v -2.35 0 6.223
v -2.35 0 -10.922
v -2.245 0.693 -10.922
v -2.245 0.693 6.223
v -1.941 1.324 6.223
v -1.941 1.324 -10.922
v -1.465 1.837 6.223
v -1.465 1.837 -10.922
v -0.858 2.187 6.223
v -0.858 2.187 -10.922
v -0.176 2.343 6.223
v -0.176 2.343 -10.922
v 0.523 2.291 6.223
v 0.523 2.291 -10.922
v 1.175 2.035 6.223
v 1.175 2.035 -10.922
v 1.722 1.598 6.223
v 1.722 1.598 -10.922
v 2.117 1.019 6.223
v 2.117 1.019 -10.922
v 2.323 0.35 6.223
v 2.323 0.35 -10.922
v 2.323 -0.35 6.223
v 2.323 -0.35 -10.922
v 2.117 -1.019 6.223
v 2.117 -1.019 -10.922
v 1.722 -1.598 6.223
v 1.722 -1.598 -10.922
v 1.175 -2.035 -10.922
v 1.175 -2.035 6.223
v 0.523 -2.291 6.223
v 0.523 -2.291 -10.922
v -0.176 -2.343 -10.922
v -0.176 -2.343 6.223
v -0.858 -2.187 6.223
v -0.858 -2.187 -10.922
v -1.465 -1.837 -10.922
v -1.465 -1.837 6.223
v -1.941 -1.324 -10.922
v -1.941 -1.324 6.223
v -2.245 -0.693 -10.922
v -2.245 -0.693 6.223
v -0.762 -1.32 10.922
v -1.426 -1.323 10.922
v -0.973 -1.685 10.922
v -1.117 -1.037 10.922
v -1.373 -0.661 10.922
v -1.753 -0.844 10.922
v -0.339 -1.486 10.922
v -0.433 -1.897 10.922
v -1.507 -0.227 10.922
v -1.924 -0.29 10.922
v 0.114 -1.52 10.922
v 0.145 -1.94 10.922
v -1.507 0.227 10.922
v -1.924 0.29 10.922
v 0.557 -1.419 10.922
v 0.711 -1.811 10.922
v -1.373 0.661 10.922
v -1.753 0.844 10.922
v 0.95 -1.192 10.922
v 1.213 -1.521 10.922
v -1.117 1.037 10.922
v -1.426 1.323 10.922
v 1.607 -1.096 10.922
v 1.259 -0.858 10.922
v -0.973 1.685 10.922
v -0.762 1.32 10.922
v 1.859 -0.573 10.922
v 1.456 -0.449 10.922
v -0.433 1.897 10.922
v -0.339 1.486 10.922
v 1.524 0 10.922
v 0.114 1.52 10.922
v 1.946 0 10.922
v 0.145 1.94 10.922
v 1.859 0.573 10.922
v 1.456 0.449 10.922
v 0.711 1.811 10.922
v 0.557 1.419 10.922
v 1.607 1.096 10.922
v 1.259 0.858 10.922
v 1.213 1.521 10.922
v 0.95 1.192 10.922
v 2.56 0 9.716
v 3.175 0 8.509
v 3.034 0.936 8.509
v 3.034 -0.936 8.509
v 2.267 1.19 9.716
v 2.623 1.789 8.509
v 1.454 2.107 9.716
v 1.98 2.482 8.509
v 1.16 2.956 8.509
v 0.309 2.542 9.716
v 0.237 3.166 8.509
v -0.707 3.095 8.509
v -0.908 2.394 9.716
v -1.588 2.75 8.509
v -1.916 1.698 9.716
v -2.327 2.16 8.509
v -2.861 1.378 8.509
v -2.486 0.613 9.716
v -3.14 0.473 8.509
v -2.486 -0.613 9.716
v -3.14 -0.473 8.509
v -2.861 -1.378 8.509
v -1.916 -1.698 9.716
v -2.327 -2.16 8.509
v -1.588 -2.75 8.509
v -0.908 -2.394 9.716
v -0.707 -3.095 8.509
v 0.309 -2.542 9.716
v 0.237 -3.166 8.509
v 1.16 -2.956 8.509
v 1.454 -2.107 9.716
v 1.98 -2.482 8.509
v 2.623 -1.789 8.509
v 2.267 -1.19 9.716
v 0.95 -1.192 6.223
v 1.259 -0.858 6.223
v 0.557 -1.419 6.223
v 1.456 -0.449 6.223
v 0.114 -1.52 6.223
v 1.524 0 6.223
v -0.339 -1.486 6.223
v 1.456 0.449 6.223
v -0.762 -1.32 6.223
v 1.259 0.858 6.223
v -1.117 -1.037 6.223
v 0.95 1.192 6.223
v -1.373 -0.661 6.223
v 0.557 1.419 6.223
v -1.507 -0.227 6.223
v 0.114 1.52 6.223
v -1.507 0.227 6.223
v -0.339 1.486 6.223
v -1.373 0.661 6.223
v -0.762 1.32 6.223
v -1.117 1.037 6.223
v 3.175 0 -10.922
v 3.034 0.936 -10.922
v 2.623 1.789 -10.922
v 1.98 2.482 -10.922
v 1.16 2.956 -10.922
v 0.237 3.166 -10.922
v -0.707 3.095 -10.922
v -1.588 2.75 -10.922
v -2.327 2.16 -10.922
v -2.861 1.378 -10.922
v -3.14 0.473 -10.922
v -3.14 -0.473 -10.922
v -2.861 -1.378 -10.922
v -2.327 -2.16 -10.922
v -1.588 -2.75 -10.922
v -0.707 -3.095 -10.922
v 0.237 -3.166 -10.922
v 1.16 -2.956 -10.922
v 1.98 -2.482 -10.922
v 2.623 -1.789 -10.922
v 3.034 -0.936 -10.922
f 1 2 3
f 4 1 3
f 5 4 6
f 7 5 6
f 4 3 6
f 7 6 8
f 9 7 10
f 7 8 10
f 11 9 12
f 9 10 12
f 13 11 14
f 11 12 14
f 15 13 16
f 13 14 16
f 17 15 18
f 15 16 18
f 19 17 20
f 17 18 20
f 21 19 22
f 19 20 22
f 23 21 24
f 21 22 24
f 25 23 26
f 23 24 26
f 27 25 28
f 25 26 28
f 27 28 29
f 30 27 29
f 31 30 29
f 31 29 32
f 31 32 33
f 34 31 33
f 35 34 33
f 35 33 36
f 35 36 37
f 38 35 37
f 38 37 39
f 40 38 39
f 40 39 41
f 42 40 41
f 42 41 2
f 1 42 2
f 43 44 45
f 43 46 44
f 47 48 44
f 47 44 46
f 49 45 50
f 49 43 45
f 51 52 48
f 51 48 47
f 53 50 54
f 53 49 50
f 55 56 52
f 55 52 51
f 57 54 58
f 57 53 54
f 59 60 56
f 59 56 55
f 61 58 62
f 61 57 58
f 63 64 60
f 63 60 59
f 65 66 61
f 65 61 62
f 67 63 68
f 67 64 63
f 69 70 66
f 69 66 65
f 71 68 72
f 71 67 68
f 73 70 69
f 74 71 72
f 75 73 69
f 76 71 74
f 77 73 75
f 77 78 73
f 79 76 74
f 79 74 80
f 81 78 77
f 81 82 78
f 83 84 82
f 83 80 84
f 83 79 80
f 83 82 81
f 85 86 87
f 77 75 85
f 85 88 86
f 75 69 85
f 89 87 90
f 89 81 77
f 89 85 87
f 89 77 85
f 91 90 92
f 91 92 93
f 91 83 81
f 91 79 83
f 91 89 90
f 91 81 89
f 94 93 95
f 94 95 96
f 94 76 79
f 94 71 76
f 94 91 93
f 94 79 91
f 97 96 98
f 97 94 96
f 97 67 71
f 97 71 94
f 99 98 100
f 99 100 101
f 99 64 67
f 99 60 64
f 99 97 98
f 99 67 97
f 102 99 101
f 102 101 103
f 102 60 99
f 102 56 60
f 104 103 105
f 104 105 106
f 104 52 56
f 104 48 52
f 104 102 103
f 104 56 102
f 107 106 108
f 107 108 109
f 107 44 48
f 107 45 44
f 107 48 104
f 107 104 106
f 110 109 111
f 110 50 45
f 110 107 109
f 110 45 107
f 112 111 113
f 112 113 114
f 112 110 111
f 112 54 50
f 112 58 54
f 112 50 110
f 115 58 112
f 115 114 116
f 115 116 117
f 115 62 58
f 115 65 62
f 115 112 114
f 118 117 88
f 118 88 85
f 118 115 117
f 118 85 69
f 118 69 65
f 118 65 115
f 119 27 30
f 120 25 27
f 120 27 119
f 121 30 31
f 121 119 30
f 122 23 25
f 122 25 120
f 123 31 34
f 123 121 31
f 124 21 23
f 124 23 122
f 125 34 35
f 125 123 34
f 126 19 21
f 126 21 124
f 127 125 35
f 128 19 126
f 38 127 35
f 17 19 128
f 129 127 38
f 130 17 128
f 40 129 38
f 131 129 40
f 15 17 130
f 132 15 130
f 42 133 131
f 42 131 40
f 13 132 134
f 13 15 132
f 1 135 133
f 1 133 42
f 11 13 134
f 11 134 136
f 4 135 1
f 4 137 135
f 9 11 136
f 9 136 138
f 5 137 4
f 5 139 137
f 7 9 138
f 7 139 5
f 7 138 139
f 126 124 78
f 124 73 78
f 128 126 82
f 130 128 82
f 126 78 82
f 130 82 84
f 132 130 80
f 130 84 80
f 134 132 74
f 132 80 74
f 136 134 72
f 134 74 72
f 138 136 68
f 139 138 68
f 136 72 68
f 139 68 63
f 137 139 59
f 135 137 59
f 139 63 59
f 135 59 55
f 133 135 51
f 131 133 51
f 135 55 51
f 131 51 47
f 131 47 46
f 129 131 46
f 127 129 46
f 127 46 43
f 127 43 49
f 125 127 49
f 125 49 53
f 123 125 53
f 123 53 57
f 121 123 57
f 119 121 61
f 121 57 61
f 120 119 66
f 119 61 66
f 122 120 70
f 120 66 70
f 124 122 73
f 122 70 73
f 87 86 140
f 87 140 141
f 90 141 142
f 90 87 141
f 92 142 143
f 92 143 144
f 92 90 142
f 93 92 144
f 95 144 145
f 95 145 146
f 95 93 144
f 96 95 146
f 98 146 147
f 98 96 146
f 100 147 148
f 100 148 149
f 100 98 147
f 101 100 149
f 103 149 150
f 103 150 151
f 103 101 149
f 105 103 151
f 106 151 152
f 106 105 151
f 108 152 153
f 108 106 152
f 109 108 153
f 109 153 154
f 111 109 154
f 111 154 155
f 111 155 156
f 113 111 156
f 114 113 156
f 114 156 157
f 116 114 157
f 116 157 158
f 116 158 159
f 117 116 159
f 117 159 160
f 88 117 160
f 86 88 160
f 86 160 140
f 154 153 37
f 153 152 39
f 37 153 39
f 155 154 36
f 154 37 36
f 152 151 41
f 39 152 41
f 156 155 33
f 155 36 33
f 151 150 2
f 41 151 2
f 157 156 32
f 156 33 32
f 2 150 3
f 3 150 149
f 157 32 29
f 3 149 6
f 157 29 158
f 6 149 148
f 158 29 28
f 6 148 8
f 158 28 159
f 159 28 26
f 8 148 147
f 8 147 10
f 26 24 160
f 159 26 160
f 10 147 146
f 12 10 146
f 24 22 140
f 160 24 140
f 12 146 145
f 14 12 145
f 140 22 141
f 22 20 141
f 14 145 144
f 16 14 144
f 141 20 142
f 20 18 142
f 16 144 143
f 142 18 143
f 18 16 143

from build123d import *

# Parameters (mm, degrees)
CROQUIS3_R                                           = 3.175
SALIENTE_EXTRUIR2_DEPTH                              = 10.922
REFRENTADO_PARA_TORNILLO_CON_CABEZA_HUEC_D           = 3.048
REFRENTADO_PARA_TORNILLO_CON_CABEZA_HUEC_CBORE_D     = 4.699
REFRENTADO_PARA_TORNILLO_CON_CABEZA_HUEC_CBORE_DEPTH = 17.145
CHAFL_N1_SIZE                                        = 2.413
CHAFL_N1_SIZE2                                       = 1.22948491


with BuildPart() as part:
    # Croquis3 → Saliente-Extruir2 (new, symmetric)
    with BuildSketch(Plane.XY):
        Circle(CROQUIS3_R)
    extrude(amount=SALIENTE_EXTRUIR2_DEPTH, both=True)

    # Refrentado para tornillo con cabeza hueca de 1/41 (through all)
    with Locations(Plane(origin=(0, 0, -10.922), x_dir=(-1, 0, 0), z_dir=(0, 0, -1))):
        with Locations((0, 0)):
            CounterBoreHole(REFRENTADO_PARA_TORNILLO_CON_CABEZA_HUEC_D / 2, REFRENTADO_PARA_TORNILLO_CON_CABEZA_HUEC_CBORE_D / 2, REFRENTADO_PARA_TORNILLO_CON_CABEZA_HUEC_CBORE_DEPTH)

    # Chaflán1
    chafl_n1_edges = [part.edges().sort_by_distance(p)[0] for p in [
        (-3.175, 0, 10.922),
    ]]
    chafl_n1_side = [part.faces().sort_by_distance(p)[0] for p in [
        (-3.175, 0, 0),
    ]]
    chamfer(chafl_n1_edges, length=CHAFL_N1_SIZE, length2=CHAFL_N1_SIZE2, reference=chafl_n1_side[0])


solid = part.part
